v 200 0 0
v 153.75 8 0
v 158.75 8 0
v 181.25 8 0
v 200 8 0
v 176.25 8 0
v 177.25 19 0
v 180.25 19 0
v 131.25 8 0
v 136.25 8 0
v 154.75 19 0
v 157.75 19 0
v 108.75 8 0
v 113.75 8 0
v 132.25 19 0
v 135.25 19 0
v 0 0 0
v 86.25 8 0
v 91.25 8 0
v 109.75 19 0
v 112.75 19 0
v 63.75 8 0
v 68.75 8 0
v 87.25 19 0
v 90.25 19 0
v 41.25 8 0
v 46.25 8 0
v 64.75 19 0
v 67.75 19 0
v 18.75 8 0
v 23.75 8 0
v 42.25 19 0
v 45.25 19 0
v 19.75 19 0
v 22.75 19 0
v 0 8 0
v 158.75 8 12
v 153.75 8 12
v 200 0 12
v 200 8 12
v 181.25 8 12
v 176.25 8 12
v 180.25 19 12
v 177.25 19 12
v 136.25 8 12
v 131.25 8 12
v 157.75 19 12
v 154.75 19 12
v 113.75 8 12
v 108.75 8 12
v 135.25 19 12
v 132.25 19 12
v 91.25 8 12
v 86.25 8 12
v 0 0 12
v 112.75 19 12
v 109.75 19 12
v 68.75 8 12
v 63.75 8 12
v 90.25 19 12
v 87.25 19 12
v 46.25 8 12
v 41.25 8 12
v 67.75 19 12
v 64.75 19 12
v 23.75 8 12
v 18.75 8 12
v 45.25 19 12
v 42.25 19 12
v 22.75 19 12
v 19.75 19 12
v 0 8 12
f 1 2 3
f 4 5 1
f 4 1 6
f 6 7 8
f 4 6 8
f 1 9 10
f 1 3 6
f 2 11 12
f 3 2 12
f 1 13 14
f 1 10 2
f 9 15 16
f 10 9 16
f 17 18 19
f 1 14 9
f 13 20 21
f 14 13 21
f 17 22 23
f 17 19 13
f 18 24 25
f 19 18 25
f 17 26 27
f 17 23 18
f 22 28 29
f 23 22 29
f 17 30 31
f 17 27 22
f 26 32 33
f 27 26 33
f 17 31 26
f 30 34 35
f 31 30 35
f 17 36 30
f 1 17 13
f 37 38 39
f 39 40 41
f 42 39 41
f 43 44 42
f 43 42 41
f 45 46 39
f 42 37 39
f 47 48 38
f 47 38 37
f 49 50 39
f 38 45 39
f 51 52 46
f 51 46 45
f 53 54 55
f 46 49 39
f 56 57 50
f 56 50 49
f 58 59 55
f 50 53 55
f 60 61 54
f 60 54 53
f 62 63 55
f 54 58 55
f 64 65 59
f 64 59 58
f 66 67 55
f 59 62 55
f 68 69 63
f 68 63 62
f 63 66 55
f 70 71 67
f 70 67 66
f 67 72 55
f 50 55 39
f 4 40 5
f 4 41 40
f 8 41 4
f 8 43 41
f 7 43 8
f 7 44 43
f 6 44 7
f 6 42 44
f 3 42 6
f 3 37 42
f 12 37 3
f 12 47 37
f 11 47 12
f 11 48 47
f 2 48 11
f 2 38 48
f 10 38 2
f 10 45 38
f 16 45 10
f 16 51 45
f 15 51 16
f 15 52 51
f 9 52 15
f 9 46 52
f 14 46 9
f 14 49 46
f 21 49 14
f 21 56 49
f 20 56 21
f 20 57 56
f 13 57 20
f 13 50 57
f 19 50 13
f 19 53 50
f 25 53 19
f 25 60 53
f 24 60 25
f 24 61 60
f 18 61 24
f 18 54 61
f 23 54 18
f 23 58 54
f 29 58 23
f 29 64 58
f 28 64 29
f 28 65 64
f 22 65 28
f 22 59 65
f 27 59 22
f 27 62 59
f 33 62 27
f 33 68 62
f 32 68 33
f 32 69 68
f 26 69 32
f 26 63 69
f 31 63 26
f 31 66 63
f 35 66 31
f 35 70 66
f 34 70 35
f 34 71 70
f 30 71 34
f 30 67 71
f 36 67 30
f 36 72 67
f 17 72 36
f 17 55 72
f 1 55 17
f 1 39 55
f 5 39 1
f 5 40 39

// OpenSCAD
$fn = 32;

// ----------------------------------------------------------------------
// Gear rack: 8 teeth on a 200 mm bar, pitch 22.5 mm
// ----------------------------------------------------------------------

// --- parameters (mm) ---
profile_height = 12;      // extrusion height
profile_points = 36;      // points of the closed outline

profile = [[0, 0], [200, 0], [200, 8], [181.25, 8], [180.25, 19], [177.25, 19], [176.25, 8], [158.75, 8], [157.75, 19], [154.75, 19], [153.75, 8], [136.25, 8], [135.25, 19], [132.25, 19], [131.25, 8], [113.75, 8], [112.75, 19], [109.75, 19], [108.75, 8], [91.25, 8], [90.25, 19], [87.25, 19], [86.25, 8], [68.75, 8], [67.75, 19], [64.75, 19], [63.75, 8], [46.25, 8], [45.25, 19], [42.25, 19], [41.25, 8], [23.75, 8], [22.75, 19], [19.75, 19], [18.75, 8], [0, 8]];  // single closed polygon, 36 points, counter clockwise

// --- the one profile operation ---
linear_extrude(height = profile_height) polygon(points = profile);
